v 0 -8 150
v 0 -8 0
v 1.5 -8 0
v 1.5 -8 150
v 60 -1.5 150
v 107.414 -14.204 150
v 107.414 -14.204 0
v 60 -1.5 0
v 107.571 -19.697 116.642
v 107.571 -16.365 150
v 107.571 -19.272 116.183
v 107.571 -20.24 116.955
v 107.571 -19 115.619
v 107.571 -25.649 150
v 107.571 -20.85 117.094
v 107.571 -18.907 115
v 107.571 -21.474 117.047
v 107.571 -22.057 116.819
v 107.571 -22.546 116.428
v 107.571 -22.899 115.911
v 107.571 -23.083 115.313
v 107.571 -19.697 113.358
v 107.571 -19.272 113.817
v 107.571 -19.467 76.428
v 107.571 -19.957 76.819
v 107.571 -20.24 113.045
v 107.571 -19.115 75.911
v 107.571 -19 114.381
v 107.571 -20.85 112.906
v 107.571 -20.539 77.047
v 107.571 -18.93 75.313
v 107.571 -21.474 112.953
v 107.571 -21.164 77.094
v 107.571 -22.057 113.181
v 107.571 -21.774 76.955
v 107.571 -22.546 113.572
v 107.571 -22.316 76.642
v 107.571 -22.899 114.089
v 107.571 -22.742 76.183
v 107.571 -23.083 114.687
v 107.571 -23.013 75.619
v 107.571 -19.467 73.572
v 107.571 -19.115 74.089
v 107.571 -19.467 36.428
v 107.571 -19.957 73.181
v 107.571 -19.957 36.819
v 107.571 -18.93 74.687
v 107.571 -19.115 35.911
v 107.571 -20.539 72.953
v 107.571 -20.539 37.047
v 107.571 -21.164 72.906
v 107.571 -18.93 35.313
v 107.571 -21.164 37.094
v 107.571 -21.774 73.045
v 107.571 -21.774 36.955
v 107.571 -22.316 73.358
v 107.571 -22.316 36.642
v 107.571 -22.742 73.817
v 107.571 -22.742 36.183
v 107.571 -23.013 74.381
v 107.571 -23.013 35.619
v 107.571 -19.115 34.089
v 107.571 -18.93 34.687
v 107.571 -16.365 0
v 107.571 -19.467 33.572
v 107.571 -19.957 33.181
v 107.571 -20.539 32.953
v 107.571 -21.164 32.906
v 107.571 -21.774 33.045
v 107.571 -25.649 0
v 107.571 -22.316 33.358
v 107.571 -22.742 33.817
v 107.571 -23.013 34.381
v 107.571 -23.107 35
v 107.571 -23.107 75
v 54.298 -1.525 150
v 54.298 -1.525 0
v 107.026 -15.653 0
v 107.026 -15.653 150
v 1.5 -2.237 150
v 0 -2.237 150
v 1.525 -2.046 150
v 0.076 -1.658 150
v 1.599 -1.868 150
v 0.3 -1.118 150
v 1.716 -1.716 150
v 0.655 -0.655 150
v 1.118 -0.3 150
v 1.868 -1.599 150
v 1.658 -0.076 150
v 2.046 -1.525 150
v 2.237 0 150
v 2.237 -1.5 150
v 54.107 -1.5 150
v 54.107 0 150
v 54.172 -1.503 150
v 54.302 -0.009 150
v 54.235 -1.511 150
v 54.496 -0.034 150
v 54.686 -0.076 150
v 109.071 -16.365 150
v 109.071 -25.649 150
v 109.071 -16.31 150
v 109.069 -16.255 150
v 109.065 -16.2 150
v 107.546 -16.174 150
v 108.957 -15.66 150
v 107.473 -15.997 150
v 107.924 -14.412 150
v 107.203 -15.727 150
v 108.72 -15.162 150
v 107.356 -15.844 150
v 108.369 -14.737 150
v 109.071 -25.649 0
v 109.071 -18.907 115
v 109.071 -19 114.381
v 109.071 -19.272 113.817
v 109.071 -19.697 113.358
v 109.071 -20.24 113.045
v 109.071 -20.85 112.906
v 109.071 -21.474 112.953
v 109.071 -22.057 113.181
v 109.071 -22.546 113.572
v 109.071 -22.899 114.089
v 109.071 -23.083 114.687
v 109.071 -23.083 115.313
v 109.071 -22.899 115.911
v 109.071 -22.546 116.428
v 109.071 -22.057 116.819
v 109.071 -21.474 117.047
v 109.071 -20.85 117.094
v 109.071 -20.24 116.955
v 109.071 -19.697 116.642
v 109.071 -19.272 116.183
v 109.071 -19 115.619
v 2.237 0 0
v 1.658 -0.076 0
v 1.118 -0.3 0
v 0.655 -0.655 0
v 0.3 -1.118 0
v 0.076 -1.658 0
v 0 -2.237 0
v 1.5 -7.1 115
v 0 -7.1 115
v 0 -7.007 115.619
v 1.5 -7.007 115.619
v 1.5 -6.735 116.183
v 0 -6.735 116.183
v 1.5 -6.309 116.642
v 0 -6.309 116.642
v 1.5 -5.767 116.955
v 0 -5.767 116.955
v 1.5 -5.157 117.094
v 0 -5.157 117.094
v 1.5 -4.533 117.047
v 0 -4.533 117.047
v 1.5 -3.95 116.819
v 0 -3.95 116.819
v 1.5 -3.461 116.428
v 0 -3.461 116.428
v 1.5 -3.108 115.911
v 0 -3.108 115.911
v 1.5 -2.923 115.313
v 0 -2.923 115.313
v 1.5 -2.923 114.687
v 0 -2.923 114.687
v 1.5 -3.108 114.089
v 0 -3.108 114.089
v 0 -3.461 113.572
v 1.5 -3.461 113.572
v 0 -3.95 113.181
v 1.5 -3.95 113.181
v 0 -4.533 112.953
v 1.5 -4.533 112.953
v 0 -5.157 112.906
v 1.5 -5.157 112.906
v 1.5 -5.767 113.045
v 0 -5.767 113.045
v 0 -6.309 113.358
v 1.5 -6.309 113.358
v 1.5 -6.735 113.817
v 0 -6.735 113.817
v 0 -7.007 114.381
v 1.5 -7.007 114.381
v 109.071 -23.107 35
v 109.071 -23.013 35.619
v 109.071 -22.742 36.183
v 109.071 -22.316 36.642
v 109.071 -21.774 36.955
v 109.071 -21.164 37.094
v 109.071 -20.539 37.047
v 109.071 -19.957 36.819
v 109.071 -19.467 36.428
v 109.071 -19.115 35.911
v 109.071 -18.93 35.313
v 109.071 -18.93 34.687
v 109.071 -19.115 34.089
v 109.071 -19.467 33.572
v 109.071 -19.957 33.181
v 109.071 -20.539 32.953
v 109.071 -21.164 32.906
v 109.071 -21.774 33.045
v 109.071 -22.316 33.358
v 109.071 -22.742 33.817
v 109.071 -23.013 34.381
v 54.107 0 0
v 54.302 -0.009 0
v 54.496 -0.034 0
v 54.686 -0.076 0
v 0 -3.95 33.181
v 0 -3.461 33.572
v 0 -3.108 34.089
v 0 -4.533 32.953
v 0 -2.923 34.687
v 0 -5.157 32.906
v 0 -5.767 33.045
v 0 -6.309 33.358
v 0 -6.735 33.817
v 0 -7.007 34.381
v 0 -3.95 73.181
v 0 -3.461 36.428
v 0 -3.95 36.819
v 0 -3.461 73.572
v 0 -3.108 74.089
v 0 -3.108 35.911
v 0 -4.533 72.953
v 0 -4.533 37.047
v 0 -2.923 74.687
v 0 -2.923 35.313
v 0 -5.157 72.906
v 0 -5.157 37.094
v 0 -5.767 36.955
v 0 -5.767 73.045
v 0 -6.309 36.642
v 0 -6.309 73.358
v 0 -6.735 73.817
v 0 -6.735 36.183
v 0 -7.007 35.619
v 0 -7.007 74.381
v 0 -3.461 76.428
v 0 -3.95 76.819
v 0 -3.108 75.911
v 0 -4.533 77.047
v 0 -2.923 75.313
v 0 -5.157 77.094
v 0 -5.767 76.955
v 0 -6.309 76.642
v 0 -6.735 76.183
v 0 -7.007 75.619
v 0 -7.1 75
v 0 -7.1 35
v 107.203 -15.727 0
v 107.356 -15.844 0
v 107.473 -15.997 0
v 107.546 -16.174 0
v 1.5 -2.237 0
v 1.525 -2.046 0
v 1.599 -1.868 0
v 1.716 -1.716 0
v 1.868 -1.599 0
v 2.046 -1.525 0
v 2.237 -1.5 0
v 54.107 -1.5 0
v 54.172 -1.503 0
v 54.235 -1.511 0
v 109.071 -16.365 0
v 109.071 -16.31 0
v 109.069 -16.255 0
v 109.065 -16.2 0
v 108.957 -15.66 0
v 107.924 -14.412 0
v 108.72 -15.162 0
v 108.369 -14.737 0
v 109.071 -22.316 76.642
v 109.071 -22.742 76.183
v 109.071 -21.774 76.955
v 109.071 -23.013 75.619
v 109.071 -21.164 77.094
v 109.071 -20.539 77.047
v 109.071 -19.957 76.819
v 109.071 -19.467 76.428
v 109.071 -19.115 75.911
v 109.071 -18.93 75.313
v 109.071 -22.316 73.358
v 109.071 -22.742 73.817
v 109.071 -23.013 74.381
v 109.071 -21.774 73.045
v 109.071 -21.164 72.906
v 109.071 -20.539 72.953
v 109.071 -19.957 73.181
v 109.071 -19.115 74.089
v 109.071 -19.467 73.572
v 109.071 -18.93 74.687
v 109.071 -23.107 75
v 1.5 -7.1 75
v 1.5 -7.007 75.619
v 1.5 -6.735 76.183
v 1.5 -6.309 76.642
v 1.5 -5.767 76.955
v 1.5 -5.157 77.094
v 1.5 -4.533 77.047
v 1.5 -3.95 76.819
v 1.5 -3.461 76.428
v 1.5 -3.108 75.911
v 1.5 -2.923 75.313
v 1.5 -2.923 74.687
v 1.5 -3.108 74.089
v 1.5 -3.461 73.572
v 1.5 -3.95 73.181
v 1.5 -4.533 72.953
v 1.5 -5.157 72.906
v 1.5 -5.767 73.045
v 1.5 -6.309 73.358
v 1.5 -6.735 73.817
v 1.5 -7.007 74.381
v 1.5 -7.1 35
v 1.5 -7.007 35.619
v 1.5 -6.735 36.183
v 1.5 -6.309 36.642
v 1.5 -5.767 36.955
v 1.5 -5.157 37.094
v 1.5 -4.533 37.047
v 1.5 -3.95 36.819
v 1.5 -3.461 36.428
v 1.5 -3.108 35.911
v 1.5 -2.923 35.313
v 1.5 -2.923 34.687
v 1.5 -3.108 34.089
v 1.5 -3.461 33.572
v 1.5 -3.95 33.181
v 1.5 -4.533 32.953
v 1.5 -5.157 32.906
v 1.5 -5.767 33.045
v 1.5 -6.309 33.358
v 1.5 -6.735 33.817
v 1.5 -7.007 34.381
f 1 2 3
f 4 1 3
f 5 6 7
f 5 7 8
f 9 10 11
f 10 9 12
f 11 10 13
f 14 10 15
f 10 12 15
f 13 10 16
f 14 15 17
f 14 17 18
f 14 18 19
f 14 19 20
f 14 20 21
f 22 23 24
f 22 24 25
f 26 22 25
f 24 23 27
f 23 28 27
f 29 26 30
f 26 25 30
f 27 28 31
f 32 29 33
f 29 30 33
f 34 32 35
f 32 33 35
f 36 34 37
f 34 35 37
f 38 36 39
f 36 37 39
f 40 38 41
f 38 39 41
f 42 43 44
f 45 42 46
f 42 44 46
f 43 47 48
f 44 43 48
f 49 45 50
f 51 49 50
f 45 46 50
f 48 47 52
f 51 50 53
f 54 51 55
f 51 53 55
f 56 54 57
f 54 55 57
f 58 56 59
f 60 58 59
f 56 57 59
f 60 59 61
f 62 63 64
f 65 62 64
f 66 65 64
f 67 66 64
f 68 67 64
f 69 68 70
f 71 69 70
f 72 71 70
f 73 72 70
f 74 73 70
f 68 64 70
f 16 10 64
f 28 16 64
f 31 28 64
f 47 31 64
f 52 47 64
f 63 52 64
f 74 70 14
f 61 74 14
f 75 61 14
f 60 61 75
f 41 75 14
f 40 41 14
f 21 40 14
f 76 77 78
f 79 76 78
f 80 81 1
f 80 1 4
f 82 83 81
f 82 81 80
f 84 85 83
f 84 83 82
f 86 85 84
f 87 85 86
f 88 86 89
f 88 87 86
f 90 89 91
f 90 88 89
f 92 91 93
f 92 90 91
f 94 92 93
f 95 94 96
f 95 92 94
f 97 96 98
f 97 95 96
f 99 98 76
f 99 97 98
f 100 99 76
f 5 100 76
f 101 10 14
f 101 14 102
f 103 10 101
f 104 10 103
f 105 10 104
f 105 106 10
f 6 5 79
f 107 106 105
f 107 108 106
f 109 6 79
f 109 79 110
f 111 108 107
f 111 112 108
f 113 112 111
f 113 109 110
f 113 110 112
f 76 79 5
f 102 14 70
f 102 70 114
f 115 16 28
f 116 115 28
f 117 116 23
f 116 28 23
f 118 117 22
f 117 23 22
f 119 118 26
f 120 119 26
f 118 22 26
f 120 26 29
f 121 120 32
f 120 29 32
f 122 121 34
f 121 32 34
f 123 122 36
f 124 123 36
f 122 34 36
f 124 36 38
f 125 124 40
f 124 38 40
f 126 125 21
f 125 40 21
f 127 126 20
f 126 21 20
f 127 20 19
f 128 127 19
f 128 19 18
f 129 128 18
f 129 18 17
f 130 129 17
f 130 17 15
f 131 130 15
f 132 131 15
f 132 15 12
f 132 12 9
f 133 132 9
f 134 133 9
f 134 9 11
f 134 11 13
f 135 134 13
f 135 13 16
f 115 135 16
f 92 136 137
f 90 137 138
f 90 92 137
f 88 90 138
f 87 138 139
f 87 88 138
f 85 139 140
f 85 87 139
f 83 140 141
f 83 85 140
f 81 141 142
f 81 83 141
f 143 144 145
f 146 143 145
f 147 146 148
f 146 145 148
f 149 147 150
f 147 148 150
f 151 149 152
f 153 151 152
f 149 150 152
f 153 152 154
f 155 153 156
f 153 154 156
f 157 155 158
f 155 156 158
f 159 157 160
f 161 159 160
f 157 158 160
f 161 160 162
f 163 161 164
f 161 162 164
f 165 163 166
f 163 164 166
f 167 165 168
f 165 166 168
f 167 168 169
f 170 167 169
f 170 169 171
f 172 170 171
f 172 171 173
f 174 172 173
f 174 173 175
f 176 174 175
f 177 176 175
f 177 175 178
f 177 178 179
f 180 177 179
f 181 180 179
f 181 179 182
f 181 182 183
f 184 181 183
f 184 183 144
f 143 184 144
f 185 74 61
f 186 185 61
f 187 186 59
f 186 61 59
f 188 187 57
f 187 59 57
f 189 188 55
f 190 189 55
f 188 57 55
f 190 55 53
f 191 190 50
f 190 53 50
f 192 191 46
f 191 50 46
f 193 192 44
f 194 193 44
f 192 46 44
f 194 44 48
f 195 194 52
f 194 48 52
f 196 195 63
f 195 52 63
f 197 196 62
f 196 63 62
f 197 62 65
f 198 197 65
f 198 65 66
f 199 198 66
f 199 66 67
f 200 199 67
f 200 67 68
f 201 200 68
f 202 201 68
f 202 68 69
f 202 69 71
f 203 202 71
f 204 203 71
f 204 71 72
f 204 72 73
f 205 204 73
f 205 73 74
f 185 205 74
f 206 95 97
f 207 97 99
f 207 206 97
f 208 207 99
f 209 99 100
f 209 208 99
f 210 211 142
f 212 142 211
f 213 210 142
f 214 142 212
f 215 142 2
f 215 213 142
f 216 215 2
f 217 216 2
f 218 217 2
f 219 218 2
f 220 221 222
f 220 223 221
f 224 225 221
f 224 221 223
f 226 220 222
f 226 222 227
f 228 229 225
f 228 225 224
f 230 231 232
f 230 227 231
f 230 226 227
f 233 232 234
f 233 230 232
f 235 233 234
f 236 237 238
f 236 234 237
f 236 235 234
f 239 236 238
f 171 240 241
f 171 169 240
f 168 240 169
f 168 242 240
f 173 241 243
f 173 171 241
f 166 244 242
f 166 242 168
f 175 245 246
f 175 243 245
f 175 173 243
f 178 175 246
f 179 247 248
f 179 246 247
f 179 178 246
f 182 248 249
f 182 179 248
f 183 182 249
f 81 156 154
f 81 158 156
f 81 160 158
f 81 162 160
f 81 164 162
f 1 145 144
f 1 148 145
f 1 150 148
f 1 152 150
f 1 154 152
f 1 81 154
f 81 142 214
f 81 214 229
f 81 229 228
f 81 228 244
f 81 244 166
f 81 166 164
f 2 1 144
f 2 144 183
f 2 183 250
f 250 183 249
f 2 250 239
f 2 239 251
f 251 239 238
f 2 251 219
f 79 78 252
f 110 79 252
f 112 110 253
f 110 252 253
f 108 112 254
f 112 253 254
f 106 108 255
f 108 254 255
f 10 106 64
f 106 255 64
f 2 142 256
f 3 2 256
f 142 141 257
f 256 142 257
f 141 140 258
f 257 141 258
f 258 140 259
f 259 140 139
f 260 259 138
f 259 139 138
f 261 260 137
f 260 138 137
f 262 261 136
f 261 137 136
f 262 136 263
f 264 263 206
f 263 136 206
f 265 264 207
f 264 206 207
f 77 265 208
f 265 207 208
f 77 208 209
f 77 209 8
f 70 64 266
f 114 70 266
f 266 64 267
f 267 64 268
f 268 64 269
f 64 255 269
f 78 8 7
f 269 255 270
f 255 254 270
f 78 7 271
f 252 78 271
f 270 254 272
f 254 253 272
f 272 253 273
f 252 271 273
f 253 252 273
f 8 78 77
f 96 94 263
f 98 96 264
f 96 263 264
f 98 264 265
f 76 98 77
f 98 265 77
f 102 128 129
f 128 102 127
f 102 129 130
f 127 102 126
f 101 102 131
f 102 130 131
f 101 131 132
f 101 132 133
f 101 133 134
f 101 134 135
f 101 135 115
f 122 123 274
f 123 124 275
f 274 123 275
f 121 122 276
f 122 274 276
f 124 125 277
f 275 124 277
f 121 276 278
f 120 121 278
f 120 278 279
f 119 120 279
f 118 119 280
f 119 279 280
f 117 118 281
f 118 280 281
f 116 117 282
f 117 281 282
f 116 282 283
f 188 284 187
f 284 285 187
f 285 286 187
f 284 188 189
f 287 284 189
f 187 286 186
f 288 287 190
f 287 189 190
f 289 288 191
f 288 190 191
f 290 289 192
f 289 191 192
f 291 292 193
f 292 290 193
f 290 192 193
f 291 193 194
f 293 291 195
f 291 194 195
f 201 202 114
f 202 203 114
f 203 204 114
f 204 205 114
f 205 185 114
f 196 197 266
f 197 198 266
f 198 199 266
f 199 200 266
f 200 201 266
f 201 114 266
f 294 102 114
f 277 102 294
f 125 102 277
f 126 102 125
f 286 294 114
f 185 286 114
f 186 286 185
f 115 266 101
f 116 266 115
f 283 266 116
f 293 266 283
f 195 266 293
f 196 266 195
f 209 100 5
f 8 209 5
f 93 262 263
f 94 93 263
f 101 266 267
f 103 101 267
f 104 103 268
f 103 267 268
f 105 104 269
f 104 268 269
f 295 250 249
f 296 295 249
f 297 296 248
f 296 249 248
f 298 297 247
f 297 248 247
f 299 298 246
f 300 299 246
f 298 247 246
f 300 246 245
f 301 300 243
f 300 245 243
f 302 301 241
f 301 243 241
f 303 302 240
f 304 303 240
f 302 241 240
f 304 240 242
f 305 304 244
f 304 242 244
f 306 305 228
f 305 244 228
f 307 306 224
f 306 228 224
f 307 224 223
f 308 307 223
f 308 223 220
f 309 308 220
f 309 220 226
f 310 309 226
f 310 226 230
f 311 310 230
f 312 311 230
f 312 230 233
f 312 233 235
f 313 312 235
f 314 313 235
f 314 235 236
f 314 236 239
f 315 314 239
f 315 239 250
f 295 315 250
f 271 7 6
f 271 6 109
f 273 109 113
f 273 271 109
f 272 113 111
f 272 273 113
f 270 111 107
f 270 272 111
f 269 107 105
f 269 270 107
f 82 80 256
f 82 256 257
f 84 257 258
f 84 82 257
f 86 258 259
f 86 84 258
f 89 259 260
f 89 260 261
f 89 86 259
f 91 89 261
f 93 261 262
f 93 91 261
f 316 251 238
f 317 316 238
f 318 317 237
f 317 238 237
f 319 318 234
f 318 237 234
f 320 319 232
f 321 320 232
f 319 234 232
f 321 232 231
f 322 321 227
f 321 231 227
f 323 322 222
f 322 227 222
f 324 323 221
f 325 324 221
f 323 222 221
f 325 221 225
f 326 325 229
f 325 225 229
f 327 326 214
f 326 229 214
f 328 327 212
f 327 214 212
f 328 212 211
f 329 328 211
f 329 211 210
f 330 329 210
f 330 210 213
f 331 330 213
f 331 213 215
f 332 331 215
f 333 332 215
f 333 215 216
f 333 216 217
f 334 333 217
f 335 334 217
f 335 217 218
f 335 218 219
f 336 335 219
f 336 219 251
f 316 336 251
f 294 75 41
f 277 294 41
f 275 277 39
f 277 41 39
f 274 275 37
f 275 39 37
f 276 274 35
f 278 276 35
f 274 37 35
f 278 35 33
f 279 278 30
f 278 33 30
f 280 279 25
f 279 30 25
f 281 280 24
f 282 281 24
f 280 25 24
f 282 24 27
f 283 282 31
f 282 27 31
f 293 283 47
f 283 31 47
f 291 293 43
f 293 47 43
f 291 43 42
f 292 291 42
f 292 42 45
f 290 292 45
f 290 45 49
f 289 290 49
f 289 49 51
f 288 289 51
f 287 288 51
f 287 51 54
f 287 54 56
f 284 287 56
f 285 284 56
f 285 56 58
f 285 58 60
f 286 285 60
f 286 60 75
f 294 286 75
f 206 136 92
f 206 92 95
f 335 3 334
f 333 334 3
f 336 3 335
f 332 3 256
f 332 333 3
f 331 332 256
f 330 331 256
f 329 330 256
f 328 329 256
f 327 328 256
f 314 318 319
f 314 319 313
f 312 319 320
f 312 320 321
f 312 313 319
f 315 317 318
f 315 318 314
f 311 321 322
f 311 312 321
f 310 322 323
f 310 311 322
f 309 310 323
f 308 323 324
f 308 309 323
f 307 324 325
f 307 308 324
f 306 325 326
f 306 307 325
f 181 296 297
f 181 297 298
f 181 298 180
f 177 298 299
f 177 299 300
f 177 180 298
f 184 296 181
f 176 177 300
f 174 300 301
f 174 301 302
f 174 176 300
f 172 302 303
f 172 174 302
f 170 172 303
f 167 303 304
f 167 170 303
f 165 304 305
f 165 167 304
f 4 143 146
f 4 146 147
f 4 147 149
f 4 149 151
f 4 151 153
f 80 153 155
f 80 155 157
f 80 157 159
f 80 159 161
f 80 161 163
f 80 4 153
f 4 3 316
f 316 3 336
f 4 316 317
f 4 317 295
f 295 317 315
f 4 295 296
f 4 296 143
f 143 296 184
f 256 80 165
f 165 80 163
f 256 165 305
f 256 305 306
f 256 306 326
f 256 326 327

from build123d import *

# Parameters (mm, degrees)
SKETCH_1_W                       = 60
SKETCH_1_H                       = 1.5
SM_BASE_FLANGE_1_DEPTH           = 150
SM_EDGE_FLANGE_1_DEPTH           = 150
SM_EDGE_FLANGE_1_2_DEPTH         = 150
SM_EDGE_FLANGE_2_STRIP_W         = 7.4732
SM_EDGE_FLANGE_2_STRIP_H         = 1.5
SM_EDGE_FLANGE_2_STRIP_CUT_DEPTH = 150
SM_EDGE_FLANGE_2_DEPTH           = 150
SKETCH_12_R                      = 2.1
CUT_EXTRUDE_1_DEPTH              = 10
SM_EDGE_FLANGE_3_DEPTH           = 150
SM_EDGE_FLANGE_3_2_DEPTH         = 150
SKETCH_16_R                      = 2.1
CUT_EXTRUDE_2_DEPTH              = 20


# Read off the part's stored shape, not the designer's step: 边线-法兰1, 边线-法兰3
# Sheet-metal steps are written as plain solids
with BuildPart() as part:
    # Sketch 1 → 基体-法兰1 (new body)
    with BuildSketch(Plane.XY):
        with Locations((30, -0.75)):
            Rectangle(SKETCH_1_W, SKETCH_1_H)
    extrude(amount=SM_BASE_FLANGE_1_DEPTH)

    # 边线-法兰1 outline → 边线-法兰1 (cut)
    with BuildSketch(Plane.XY):
        with BuildLine():
            ThreePointArc((54.107469813, 0), (54.399404694, -0.019134423), (54.686344489, -0.076210297))
            Line((54.686344489, -0.076210297), (60, -1.5))
            Line((60, -1.5), (60, 0))
            Line((60, 0), (54.107469813, 0))
        make_face()
    extrude(amount=SM_EDGE_FLANGE_1_DEPTH, mode=Mode.SUBTRACT)

    # Sm Edge Flange 1 2 outline → Sm Edge Flange 1 2 (add)
    with BuildSketch(Plane.XY):
        with BuildLine():
            Line((109.459695887, -14.752685571), (60, -1.5))
            Line((60, -1.5), (54.107469813, -1.5))
            ThreePointArc((54.107469813, -1.5), (54.203615406, -1.506301715), (54.298115921, -1.525099036))
            Line((54.298115921, -1.525099036), (109.071467319, -16.20157431))
            Line((109.071467319, -16.20157431), (109.459695887, -14.752685571))
        make_face()
    extrude(amount=SM_EDGE_FLANGE_1_2_DEPTH)

    # 边线-法兰2 strip (across the edge) → 边线-法兰2 strip cut (cut)
    with BuildSketch(Plane(origin=(0, -1.5, 150), x_dir=(1, 0, 0), z_dir=(0, 0, -1))):
        with Locations((-1.5, -0.75)):
            Rectangle(SM_EDGE_FLANGE_2_STRIP_W, SM_EDGE_FLANGE_2_STRIP_H)
    extrude(amount=SM_EDGE_FLANGE_2_STRIP_CUT_DEPTH, mode=Mode.SUBTRACT)

    # 边线-法兰2 section (across the edge) → 边线-法兰2 (add)
    with BuildSketch(Plane(origin=(0, -1.5, 150), x_dir=(1, 0, 0), z_dir=(0, 0, -1))):
        with BuildLine():
            Line((0, 0.7366), (0, 6.5))
            Line((0, 6.5), (1.5, 6.5))
            Line((1.5, 6.5), (1.5, 0.7366))
            ThreePointArc((1.5, 0.7366), (1.715745145, 0.215745145), (2.2366, 0))
            Line((2.2366, 0), (2.2366, -1.5))
            ThreePointArc((2.2366, -1.5), (0.655084973, -0.844915027), (0, 0.7366))
        make_face()
    extrude(amount=SM_EDGE_FLANGE_2_DEPTH)

    # 草图12 → 切除-拉伸1 (cut)
    with BuildSketch(Plane.ZY):
        with Locations(Location((35, -5, 0), (0, 0, 270))):
            Circle(SKETCH_12_R)
        with Locations(Location((75, -5, 0), (0, 0, 270))):
            Circle(SKETCH_12_R)
        with Locations(Location((115, -5, 0), (0, 0, 270))):
            Circle(SKETCH_12_R)
    extrude(amount=-CUT_EXTRUDE_1_DEPTH, mode=Mode.SUBTRACT)

    # 边线-法兰3 outline → 边线-法兰3 (cut)
    with BuildSketch(Plane.XY):
        with BuildLine():
            ThreePointArc((107.413741996, -14.204473878), (108.55784048, -14.938769949), (109.065378631, -16.199942851))
            Line((109.065378631, -16.199942851), (109.071467319, -16.20157431))
            Line((109.071467319, -16.20157431), (109.459695887, -14.752685571))
            Line((109.459695887, -14.752685571), (107.413741996, -14.204473878))
        make_face()
    extrude(amount=SM_EDGE_FLANGE_3_DEPTH, mode=Mode.SUBTRACT)

    # Sm Edge Flange 3 2 outline → Sm Edge Flange 3 2 (add)
    with BuildSketch(Plane.XY):
        with BuildLine():
            Line((109.071467319, -25.64866004), (109.071467319, -16.364863581))
            ThreePointArc((109.071467319, -16.364863581), (109.069944629, -16.282347038), (109.065378631, -16.199942851))
            Line((109.065378631, -16.199942851), (107.025513428, -15.653362617))
            ThreePointArc((107.025513428, -15.653362617), (107.41925139, -15.916449912), (107.571467319, -16.364863581))
            Line((107.571467319, -16.364863581), (107.571467319, -25.64866004))
            Line((107.571467319, -25.64866004), (109.071467319, -25.64866004))
        make_face()
    extrude(amount=SM_EDGE_FLANGE_3_2_DEPTH)

    # 草图16 → 切除-拉伸2 (cut)
    with BuildSketch(Plane.ZY.offset(-107.571467319)):
        with Locations(Location((35, -21.00676181, 0), (0, 0, 270))):
            Circle(SKETCH_16_R)
        with Locations(Location((75, -21.00676181, 0), (0, 0, 270))):
            Circle(SKETCH_16_R)
        with Locations(Location((115, -21.00676181, 0), (0, 0, 90))):
            Circle(SKETCH_16_R)
    extrude(amount=-CUT_EXTRUDE_2_DEPTH, mode=Mode.SUBTRACT)


solid = part.part
